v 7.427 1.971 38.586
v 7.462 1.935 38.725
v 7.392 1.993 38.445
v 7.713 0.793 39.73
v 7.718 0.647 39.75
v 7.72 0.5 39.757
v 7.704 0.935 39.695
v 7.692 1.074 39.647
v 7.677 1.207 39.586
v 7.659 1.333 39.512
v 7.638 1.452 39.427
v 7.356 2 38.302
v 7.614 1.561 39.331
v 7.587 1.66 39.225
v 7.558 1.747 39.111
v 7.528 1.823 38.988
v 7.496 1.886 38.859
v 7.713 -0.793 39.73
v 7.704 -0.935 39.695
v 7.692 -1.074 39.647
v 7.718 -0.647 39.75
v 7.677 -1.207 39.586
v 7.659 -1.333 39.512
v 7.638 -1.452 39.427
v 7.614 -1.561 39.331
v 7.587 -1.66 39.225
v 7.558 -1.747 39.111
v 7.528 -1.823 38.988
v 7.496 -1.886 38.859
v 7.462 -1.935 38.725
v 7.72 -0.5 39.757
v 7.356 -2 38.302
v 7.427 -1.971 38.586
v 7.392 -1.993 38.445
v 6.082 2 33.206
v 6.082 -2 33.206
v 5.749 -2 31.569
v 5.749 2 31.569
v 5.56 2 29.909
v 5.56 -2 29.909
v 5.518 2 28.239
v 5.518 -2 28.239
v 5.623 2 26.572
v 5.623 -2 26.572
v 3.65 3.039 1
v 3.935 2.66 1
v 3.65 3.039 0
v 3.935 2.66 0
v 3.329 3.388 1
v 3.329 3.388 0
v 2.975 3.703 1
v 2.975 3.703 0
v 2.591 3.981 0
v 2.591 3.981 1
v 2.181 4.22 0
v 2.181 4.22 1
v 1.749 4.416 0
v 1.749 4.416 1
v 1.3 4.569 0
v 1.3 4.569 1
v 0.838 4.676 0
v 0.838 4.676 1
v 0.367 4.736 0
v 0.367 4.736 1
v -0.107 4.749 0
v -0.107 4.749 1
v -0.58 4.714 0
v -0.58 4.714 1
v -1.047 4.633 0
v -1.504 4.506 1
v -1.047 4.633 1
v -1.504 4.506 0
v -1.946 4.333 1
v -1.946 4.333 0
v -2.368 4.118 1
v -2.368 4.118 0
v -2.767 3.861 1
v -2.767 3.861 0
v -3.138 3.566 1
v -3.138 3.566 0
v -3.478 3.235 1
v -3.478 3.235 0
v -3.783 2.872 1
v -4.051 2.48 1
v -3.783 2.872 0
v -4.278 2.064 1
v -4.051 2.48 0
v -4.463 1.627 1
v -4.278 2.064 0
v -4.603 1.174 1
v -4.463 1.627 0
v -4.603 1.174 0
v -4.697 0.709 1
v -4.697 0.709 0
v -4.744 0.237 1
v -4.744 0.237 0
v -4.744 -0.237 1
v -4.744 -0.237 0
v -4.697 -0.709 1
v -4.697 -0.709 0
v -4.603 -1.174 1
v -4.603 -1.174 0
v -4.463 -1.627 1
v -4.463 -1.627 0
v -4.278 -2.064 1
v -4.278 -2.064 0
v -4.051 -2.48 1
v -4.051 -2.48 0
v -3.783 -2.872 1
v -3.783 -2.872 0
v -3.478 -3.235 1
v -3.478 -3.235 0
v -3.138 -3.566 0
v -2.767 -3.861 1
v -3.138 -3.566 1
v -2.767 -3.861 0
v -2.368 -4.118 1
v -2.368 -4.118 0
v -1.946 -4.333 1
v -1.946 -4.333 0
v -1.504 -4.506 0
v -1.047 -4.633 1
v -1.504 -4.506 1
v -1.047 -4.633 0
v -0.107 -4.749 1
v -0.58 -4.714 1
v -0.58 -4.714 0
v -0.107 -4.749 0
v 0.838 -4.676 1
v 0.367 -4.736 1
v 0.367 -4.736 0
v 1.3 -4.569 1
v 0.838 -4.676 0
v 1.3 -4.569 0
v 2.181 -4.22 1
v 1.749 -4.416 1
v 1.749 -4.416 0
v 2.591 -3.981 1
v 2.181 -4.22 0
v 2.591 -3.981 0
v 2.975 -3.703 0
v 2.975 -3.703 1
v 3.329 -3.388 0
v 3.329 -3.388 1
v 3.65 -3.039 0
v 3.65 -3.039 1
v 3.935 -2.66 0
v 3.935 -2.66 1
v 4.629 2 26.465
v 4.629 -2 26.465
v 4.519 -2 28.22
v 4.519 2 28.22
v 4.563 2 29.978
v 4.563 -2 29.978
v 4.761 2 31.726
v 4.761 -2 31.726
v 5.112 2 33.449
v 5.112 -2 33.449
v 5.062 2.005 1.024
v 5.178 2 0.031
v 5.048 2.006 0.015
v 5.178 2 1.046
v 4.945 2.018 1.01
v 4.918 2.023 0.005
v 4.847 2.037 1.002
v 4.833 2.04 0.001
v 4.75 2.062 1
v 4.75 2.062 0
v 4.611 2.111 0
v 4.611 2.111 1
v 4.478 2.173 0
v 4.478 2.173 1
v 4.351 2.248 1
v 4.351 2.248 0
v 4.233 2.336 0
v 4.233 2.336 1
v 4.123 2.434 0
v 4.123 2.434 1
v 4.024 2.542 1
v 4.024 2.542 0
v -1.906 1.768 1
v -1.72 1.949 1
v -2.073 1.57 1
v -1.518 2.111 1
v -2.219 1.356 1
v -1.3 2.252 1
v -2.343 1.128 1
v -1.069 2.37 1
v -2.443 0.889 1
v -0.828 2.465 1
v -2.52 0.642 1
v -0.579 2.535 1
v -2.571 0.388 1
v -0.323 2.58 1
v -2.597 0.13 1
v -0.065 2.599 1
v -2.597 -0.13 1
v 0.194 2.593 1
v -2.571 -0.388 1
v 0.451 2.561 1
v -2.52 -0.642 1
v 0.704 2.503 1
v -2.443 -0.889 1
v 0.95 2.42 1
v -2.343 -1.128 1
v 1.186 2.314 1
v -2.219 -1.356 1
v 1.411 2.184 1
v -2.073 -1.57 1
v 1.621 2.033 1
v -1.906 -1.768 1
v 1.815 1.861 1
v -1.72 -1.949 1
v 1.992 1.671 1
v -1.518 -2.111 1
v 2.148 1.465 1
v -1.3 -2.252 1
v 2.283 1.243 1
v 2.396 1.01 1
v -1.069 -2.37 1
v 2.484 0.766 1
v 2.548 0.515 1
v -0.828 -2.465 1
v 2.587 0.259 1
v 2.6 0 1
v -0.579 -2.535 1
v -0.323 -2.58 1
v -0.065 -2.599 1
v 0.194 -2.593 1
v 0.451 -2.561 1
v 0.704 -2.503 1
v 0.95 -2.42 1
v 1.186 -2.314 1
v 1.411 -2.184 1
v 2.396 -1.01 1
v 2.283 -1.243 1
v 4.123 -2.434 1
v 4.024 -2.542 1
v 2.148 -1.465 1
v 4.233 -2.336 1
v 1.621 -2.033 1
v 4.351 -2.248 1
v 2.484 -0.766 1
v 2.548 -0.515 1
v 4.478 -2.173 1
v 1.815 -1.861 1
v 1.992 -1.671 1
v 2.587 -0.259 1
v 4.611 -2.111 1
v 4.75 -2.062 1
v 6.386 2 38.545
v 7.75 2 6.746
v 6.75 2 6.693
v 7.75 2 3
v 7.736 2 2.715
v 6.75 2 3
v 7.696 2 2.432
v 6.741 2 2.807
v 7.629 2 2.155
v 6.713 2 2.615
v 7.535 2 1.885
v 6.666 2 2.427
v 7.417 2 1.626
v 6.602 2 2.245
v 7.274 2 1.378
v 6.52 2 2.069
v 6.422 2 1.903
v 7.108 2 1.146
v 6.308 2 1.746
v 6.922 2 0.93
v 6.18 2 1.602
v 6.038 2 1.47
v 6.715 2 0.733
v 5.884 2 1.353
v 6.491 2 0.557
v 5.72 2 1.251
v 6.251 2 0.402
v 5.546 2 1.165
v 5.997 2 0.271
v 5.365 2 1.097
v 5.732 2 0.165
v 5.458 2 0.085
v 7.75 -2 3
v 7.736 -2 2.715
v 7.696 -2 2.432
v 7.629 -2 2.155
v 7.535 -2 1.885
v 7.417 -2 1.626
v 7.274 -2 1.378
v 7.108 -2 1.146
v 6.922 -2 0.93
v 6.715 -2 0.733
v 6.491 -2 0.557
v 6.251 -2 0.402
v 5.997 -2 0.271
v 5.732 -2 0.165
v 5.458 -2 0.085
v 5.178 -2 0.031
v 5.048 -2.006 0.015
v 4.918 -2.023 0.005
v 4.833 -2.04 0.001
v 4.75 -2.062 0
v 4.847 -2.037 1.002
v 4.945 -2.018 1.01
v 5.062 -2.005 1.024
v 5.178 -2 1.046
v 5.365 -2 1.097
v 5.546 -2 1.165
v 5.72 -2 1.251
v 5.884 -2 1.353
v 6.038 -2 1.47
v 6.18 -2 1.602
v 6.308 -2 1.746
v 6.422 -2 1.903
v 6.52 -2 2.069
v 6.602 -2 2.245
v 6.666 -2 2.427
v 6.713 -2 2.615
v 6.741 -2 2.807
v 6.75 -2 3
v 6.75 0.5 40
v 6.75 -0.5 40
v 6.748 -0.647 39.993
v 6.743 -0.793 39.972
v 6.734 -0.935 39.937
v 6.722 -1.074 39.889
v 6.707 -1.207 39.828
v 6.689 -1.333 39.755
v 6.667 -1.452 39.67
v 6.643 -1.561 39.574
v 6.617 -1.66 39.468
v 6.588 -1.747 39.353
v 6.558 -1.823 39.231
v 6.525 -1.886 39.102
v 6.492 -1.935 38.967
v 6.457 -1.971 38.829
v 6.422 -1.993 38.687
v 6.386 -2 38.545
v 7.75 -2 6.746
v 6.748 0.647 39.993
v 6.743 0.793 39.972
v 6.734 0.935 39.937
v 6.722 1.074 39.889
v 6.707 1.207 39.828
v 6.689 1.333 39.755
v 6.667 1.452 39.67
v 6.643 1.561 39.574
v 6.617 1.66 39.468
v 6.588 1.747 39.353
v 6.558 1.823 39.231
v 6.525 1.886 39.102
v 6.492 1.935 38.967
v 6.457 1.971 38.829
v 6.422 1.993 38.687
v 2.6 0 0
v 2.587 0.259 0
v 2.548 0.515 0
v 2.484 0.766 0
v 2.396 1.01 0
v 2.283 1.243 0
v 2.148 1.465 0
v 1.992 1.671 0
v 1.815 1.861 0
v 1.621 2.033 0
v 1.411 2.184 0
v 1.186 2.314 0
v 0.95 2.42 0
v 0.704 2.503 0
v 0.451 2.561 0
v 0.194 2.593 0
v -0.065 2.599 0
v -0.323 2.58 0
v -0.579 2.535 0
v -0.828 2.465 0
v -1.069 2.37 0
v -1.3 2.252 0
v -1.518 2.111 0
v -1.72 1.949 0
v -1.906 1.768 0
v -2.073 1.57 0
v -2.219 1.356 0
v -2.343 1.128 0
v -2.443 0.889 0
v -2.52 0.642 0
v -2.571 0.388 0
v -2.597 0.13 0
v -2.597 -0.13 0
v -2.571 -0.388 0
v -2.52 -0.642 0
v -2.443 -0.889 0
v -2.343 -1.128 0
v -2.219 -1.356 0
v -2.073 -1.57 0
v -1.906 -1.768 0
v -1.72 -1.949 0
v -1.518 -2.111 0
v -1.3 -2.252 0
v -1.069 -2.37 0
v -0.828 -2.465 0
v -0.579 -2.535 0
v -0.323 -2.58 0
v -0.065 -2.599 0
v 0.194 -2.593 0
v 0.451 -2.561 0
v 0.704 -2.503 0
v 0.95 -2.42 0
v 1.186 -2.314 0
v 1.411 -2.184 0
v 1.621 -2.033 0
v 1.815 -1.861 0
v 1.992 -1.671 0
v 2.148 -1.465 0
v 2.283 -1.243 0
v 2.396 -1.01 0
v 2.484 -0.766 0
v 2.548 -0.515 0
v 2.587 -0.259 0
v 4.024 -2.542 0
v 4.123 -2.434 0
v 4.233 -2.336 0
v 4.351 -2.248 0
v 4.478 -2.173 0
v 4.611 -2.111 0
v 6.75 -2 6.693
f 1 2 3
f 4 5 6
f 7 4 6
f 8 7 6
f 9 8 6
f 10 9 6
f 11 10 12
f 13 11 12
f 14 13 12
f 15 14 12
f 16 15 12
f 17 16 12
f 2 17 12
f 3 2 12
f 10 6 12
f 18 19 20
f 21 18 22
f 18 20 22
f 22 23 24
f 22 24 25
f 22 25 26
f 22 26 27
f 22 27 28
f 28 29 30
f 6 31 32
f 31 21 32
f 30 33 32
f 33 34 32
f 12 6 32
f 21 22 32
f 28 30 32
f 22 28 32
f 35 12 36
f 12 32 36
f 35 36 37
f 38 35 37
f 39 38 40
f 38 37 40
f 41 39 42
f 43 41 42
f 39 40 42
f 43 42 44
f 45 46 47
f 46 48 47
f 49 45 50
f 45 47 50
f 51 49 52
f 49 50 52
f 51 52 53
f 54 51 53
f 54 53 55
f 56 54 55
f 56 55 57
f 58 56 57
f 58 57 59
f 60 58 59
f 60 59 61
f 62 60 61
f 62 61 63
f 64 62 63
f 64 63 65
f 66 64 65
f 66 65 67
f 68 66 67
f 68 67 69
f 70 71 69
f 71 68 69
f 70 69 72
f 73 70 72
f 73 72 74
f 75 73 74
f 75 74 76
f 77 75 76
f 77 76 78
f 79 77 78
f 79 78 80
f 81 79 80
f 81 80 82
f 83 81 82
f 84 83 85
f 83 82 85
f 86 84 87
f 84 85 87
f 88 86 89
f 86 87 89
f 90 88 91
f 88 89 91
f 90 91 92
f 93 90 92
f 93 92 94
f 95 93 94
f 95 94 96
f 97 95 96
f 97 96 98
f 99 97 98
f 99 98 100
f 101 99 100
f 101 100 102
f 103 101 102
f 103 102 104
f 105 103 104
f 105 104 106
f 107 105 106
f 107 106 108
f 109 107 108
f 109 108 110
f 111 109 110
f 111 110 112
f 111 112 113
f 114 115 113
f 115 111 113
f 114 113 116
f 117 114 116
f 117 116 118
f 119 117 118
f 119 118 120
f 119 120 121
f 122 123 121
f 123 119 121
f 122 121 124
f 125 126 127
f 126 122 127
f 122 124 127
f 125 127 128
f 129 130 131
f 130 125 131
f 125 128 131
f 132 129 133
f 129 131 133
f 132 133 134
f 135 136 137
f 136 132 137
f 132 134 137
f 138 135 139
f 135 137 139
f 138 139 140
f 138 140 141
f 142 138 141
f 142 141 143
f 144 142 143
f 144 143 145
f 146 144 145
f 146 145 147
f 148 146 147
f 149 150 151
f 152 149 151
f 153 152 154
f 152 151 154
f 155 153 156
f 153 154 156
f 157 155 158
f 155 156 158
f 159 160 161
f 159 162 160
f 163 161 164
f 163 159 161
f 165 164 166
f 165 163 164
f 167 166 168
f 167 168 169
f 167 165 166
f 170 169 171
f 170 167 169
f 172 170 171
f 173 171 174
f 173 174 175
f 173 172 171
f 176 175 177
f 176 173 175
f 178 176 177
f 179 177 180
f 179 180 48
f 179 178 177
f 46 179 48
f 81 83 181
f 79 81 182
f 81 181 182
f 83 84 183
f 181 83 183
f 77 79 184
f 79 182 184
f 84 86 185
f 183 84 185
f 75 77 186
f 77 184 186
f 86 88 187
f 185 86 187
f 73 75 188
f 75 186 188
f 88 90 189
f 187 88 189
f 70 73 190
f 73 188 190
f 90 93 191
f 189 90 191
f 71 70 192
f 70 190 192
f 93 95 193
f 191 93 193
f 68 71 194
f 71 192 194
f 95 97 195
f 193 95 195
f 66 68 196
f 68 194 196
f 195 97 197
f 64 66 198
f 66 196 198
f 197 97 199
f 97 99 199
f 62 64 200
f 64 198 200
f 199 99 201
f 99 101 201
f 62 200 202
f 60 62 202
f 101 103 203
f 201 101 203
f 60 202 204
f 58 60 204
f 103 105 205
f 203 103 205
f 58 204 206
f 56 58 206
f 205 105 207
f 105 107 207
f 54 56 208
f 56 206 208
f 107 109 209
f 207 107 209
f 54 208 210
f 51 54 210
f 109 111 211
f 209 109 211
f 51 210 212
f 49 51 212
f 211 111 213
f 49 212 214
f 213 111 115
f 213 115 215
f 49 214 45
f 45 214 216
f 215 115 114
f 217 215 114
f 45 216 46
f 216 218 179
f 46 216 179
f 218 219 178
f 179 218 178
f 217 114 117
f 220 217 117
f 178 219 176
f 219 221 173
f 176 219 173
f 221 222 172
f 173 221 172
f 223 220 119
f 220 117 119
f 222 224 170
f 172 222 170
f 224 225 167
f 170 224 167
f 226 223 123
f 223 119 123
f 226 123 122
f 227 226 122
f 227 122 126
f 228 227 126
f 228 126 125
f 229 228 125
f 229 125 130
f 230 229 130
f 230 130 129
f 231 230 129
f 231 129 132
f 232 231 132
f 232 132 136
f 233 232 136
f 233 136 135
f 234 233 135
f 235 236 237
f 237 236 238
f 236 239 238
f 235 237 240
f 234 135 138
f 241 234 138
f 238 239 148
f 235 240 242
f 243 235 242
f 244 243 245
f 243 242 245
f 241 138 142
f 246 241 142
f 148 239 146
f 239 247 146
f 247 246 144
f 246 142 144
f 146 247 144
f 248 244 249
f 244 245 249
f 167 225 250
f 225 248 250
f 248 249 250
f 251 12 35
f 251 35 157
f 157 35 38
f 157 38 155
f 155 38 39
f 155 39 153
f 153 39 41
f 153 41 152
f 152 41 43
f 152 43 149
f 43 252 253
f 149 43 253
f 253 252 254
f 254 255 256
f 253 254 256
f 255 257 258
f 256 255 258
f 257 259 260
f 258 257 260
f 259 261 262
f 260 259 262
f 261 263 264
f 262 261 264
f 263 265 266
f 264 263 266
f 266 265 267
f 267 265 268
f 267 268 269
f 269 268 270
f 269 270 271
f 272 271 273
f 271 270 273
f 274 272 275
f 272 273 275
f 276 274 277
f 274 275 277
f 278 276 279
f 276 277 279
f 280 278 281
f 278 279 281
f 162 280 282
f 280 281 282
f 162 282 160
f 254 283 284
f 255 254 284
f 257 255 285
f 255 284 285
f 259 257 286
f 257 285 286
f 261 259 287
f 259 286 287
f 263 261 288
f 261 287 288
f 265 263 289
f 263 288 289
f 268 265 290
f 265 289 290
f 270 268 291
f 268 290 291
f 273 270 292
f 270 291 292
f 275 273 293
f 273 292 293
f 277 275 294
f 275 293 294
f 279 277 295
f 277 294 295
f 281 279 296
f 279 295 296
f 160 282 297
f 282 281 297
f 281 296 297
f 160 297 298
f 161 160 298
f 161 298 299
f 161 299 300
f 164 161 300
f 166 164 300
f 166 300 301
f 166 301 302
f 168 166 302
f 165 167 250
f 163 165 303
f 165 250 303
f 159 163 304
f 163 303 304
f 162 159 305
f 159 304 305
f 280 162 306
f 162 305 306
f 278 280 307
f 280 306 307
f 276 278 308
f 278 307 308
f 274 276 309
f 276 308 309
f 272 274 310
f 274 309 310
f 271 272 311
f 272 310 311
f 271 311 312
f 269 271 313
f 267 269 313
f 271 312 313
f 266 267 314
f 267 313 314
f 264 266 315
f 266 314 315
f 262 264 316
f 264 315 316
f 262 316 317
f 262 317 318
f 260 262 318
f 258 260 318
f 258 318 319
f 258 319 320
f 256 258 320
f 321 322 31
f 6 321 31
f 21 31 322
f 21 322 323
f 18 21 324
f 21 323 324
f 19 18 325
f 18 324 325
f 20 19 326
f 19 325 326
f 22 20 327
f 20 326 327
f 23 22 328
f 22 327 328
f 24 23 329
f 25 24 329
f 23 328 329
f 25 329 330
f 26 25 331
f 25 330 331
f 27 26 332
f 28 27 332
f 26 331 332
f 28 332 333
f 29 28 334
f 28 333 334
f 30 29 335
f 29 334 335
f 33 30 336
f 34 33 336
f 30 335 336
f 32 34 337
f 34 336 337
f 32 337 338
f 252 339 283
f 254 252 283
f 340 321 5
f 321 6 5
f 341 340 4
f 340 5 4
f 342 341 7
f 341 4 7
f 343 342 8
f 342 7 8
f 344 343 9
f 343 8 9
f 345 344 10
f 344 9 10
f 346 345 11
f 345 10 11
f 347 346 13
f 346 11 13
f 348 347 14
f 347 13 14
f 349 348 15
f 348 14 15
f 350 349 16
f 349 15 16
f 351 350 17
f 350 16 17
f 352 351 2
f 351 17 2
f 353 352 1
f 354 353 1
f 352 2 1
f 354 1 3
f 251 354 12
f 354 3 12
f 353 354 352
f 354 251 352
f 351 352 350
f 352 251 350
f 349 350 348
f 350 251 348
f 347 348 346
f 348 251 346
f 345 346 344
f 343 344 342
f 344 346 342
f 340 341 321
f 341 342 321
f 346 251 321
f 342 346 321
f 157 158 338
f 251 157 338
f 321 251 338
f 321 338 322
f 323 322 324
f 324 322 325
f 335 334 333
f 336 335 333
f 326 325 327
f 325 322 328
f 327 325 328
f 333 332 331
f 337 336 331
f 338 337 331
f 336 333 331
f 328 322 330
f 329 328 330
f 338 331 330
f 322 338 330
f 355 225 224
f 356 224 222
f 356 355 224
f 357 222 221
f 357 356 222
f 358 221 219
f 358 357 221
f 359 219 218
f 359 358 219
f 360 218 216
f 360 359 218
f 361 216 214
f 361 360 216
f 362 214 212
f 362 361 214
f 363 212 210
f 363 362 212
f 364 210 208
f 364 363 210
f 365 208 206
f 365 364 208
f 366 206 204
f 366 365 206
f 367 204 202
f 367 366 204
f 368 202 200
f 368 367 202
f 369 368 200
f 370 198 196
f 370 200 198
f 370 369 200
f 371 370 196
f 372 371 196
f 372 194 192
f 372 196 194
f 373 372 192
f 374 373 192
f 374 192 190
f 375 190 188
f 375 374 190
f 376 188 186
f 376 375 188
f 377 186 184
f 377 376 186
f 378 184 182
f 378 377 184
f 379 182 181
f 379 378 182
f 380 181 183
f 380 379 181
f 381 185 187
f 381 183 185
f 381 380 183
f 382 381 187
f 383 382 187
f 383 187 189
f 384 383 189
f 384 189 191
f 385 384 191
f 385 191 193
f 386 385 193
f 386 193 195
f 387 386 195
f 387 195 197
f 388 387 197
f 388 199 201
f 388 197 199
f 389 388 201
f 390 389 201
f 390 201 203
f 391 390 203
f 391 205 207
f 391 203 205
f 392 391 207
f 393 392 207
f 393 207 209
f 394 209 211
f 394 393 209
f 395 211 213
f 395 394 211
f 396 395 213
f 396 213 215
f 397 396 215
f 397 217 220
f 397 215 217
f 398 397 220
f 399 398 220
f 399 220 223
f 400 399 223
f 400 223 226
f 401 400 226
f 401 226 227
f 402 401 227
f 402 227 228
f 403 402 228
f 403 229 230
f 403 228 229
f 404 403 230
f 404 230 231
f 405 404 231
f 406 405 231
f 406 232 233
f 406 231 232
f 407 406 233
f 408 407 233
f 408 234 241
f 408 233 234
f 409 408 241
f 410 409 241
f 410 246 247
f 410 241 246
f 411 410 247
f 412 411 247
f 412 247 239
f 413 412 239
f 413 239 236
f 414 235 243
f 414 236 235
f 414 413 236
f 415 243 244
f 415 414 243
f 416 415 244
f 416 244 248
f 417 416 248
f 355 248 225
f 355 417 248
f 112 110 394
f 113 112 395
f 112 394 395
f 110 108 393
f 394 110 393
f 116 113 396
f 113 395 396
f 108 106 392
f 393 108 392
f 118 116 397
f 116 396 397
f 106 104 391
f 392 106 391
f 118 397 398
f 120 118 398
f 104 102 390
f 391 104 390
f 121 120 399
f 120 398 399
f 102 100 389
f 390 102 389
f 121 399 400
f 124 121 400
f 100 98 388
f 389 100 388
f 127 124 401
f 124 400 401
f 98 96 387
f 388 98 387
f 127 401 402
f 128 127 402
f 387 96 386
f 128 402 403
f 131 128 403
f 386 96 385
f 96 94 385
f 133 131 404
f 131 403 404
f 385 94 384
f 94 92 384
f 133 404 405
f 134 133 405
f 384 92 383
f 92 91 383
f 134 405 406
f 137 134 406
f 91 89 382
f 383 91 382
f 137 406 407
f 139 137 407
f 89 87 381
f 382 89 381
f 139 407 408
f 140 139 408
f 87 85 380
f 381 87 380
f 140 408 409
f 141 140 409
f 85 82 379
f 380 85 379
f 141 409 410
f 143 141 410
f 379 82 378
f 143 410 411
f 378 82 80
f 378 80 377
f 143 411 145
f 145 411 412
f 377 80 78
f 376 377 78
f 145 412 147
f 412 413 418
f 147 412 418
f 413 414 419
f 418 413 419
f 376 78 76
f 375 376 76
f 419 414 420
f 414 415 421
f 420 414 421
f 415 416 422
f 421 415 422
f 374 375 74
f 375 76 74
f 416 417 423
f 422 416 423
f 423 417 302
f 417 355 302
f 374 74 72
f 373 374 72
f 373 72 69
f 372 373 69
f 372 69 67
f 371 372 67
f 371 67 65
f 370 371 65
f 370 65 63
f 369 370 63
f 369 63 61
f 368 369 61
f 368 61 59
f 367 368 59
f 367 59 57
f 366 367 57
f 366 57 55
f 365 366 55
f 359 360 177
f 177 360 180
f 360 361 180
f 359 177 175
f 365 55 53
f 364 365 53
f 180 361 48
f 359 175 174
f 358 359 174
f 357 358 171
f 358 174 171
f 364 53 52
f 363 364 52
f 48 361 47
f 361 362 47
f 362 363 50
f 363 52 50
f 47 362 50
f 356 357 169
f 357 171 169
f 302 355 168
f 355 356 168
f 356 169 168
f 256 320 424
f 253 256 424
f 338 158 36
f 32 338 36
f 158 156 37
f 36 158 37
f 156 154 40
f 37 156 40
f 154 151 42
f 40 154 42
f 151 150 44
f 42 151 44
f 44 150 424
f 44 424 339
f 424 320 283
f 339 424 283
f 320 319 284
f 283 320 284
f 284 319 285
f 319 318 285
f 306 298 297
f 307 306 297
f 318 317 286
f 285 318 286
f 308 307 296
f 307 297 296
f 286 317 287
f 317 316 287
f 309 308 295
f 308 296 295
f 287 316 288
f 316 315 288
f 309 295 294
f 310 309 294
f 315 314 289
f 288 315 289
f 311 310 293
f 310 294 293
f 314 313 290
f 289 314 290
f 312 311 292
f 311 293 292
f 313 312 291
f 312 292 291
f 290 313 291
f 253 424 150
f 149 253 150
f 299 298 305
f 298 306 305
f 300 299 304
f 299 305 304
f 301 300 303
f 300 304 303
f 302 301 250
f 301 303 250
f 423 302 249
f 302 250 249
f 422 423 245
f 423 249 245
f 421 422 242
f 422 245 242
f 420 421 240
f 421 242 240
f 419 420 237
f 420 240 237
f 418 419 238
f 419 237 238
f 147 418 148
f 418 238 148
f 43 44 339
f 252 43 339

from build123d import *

# Parameters (mm, degrees)
F0_R     = 2.6
F1_DEPTH = 40
F3_DEPTH = 12.5
F4_R     = 1.5


with BuildPart() as f1:
    # F0 (on Top) → F1 (new body)
    with BuildSketch(Plane.XY):
        with BuildLine():
            Line((8.75, 2), (4.3084219849, 2))
            ThreePointArc((4.3084219849, 2), (-4.75, 0), (4.3084219849, -2))
            Line((4.3084219849, -2), (8.75, -2))
            Line((8.75, -2), (8.75, 2))
        make_face()
        Circle(F0_R, mode=Mode.SUBTRACT)
    extrude(amount=F1_DEPTH)

    # F2 (on Front) → F3 (cut, symmetric)
    with BuildSketch(Plane.XZ):
        with BuildLine():
            Line((10.2479401976, 42.5026379526), (7.7201425001, 39.757464375))
            Line((7.7201425001, 39.757464375), (6.082376492, 33.2064003424))
            ThreePointArc((6.082376492, 33.2064003424), (5.5603768051, 29.9093586064), (5.6234510612, 26.5718461314))
            Line((5.6234510612, 26.5718461314), (7.75, 6.7463273263))
            Line((7.75, 6.7463273263), (7.75, 3))
            ThreePointArc((7.75, 3), (6.8713203436, 0.8786796564), (4.75, 0))
            Line((4.75, 0), (-9.0971523896, 0))
            Line((-9.0971523896, 0), (-9.0971523896, -6.0571944341))
            Line((-9.0971523896, -6.0571944341), (12.3898674946, -5.0901651477))
            Line((12.3898674946, -5.0901651477), (10.2479401976, 42.5026379526))
        make_face()
        with BuildLine():
            Line((-9.0971523896, 1), (4.75, 1))
            ThreePointArc((4.75, 1), (6.1642135624, 1.5857864376), (6.75, 3))
            Line((6.75, 3), (6.75, 6.6928490996))
            Line((6.75, 6.6928490996), (4.629154591, 26.4651946927))
            ThreePointArc((4.629154591, 26.4651946927), (4.5627606372, 29.978365719), (5.1122339919, 33.4489359674))
            Line((5.1122339919, 33.4489359674), (6.75, 40))
            Line((6.75, 40), (-4.4842101634, 43.9101681113))
            Line((-4.4842101634, 43.9101681113), (-11.3513292745, 32.9360663891))
            Line((-11.3513292745, 32.9360663891), (-9.0971523896, 1))
        make_face()
        Polygon((5.6231939234, 43.9101681113), (6.75, 40), (7.7201425001, 39.757464375), (10.2479401976, 42.5026379526), align=None)
    extrude(amount=F3_DEPTH, both=True, mode=Mode.SUBTRACT)

    # F4 (call 1 of 4: OpenCascade refuses the feature's edges together)
    f4_edges = [f1.edges().sort_by_distance(p)[0] for p in [
        (7.235071, -2, 39.878732),
    ]]
    fillet(f4_edges, radius=F4_R)

    # F4#2 (call 2 of 4)
    f4_2_edges = [f1.edges().sort_by_distance(p)[0] for p in [
        (7.235071, 2, 39.878732),
    ]]
    fillet(f4_2_edges, radius=F4_R)

    # F4#3 (call 3 of 4)
    f4_3_edges = [f1.edges().sort_by_distance(p)[0] for p in [
        (4.308422, -2, 0.5),
    ]]
    fillet(f4_3_edges, radius=F4_R)

    # F4#4 (call 4 of 4)
    f4_4_edges = [f1.edges().sort_by_distance(p)[0] for p in [
        (4.308422, 2, 0.5),
    ]]
    fillet(f4_4_edges, radius=F4_R)


solid = f1.part
